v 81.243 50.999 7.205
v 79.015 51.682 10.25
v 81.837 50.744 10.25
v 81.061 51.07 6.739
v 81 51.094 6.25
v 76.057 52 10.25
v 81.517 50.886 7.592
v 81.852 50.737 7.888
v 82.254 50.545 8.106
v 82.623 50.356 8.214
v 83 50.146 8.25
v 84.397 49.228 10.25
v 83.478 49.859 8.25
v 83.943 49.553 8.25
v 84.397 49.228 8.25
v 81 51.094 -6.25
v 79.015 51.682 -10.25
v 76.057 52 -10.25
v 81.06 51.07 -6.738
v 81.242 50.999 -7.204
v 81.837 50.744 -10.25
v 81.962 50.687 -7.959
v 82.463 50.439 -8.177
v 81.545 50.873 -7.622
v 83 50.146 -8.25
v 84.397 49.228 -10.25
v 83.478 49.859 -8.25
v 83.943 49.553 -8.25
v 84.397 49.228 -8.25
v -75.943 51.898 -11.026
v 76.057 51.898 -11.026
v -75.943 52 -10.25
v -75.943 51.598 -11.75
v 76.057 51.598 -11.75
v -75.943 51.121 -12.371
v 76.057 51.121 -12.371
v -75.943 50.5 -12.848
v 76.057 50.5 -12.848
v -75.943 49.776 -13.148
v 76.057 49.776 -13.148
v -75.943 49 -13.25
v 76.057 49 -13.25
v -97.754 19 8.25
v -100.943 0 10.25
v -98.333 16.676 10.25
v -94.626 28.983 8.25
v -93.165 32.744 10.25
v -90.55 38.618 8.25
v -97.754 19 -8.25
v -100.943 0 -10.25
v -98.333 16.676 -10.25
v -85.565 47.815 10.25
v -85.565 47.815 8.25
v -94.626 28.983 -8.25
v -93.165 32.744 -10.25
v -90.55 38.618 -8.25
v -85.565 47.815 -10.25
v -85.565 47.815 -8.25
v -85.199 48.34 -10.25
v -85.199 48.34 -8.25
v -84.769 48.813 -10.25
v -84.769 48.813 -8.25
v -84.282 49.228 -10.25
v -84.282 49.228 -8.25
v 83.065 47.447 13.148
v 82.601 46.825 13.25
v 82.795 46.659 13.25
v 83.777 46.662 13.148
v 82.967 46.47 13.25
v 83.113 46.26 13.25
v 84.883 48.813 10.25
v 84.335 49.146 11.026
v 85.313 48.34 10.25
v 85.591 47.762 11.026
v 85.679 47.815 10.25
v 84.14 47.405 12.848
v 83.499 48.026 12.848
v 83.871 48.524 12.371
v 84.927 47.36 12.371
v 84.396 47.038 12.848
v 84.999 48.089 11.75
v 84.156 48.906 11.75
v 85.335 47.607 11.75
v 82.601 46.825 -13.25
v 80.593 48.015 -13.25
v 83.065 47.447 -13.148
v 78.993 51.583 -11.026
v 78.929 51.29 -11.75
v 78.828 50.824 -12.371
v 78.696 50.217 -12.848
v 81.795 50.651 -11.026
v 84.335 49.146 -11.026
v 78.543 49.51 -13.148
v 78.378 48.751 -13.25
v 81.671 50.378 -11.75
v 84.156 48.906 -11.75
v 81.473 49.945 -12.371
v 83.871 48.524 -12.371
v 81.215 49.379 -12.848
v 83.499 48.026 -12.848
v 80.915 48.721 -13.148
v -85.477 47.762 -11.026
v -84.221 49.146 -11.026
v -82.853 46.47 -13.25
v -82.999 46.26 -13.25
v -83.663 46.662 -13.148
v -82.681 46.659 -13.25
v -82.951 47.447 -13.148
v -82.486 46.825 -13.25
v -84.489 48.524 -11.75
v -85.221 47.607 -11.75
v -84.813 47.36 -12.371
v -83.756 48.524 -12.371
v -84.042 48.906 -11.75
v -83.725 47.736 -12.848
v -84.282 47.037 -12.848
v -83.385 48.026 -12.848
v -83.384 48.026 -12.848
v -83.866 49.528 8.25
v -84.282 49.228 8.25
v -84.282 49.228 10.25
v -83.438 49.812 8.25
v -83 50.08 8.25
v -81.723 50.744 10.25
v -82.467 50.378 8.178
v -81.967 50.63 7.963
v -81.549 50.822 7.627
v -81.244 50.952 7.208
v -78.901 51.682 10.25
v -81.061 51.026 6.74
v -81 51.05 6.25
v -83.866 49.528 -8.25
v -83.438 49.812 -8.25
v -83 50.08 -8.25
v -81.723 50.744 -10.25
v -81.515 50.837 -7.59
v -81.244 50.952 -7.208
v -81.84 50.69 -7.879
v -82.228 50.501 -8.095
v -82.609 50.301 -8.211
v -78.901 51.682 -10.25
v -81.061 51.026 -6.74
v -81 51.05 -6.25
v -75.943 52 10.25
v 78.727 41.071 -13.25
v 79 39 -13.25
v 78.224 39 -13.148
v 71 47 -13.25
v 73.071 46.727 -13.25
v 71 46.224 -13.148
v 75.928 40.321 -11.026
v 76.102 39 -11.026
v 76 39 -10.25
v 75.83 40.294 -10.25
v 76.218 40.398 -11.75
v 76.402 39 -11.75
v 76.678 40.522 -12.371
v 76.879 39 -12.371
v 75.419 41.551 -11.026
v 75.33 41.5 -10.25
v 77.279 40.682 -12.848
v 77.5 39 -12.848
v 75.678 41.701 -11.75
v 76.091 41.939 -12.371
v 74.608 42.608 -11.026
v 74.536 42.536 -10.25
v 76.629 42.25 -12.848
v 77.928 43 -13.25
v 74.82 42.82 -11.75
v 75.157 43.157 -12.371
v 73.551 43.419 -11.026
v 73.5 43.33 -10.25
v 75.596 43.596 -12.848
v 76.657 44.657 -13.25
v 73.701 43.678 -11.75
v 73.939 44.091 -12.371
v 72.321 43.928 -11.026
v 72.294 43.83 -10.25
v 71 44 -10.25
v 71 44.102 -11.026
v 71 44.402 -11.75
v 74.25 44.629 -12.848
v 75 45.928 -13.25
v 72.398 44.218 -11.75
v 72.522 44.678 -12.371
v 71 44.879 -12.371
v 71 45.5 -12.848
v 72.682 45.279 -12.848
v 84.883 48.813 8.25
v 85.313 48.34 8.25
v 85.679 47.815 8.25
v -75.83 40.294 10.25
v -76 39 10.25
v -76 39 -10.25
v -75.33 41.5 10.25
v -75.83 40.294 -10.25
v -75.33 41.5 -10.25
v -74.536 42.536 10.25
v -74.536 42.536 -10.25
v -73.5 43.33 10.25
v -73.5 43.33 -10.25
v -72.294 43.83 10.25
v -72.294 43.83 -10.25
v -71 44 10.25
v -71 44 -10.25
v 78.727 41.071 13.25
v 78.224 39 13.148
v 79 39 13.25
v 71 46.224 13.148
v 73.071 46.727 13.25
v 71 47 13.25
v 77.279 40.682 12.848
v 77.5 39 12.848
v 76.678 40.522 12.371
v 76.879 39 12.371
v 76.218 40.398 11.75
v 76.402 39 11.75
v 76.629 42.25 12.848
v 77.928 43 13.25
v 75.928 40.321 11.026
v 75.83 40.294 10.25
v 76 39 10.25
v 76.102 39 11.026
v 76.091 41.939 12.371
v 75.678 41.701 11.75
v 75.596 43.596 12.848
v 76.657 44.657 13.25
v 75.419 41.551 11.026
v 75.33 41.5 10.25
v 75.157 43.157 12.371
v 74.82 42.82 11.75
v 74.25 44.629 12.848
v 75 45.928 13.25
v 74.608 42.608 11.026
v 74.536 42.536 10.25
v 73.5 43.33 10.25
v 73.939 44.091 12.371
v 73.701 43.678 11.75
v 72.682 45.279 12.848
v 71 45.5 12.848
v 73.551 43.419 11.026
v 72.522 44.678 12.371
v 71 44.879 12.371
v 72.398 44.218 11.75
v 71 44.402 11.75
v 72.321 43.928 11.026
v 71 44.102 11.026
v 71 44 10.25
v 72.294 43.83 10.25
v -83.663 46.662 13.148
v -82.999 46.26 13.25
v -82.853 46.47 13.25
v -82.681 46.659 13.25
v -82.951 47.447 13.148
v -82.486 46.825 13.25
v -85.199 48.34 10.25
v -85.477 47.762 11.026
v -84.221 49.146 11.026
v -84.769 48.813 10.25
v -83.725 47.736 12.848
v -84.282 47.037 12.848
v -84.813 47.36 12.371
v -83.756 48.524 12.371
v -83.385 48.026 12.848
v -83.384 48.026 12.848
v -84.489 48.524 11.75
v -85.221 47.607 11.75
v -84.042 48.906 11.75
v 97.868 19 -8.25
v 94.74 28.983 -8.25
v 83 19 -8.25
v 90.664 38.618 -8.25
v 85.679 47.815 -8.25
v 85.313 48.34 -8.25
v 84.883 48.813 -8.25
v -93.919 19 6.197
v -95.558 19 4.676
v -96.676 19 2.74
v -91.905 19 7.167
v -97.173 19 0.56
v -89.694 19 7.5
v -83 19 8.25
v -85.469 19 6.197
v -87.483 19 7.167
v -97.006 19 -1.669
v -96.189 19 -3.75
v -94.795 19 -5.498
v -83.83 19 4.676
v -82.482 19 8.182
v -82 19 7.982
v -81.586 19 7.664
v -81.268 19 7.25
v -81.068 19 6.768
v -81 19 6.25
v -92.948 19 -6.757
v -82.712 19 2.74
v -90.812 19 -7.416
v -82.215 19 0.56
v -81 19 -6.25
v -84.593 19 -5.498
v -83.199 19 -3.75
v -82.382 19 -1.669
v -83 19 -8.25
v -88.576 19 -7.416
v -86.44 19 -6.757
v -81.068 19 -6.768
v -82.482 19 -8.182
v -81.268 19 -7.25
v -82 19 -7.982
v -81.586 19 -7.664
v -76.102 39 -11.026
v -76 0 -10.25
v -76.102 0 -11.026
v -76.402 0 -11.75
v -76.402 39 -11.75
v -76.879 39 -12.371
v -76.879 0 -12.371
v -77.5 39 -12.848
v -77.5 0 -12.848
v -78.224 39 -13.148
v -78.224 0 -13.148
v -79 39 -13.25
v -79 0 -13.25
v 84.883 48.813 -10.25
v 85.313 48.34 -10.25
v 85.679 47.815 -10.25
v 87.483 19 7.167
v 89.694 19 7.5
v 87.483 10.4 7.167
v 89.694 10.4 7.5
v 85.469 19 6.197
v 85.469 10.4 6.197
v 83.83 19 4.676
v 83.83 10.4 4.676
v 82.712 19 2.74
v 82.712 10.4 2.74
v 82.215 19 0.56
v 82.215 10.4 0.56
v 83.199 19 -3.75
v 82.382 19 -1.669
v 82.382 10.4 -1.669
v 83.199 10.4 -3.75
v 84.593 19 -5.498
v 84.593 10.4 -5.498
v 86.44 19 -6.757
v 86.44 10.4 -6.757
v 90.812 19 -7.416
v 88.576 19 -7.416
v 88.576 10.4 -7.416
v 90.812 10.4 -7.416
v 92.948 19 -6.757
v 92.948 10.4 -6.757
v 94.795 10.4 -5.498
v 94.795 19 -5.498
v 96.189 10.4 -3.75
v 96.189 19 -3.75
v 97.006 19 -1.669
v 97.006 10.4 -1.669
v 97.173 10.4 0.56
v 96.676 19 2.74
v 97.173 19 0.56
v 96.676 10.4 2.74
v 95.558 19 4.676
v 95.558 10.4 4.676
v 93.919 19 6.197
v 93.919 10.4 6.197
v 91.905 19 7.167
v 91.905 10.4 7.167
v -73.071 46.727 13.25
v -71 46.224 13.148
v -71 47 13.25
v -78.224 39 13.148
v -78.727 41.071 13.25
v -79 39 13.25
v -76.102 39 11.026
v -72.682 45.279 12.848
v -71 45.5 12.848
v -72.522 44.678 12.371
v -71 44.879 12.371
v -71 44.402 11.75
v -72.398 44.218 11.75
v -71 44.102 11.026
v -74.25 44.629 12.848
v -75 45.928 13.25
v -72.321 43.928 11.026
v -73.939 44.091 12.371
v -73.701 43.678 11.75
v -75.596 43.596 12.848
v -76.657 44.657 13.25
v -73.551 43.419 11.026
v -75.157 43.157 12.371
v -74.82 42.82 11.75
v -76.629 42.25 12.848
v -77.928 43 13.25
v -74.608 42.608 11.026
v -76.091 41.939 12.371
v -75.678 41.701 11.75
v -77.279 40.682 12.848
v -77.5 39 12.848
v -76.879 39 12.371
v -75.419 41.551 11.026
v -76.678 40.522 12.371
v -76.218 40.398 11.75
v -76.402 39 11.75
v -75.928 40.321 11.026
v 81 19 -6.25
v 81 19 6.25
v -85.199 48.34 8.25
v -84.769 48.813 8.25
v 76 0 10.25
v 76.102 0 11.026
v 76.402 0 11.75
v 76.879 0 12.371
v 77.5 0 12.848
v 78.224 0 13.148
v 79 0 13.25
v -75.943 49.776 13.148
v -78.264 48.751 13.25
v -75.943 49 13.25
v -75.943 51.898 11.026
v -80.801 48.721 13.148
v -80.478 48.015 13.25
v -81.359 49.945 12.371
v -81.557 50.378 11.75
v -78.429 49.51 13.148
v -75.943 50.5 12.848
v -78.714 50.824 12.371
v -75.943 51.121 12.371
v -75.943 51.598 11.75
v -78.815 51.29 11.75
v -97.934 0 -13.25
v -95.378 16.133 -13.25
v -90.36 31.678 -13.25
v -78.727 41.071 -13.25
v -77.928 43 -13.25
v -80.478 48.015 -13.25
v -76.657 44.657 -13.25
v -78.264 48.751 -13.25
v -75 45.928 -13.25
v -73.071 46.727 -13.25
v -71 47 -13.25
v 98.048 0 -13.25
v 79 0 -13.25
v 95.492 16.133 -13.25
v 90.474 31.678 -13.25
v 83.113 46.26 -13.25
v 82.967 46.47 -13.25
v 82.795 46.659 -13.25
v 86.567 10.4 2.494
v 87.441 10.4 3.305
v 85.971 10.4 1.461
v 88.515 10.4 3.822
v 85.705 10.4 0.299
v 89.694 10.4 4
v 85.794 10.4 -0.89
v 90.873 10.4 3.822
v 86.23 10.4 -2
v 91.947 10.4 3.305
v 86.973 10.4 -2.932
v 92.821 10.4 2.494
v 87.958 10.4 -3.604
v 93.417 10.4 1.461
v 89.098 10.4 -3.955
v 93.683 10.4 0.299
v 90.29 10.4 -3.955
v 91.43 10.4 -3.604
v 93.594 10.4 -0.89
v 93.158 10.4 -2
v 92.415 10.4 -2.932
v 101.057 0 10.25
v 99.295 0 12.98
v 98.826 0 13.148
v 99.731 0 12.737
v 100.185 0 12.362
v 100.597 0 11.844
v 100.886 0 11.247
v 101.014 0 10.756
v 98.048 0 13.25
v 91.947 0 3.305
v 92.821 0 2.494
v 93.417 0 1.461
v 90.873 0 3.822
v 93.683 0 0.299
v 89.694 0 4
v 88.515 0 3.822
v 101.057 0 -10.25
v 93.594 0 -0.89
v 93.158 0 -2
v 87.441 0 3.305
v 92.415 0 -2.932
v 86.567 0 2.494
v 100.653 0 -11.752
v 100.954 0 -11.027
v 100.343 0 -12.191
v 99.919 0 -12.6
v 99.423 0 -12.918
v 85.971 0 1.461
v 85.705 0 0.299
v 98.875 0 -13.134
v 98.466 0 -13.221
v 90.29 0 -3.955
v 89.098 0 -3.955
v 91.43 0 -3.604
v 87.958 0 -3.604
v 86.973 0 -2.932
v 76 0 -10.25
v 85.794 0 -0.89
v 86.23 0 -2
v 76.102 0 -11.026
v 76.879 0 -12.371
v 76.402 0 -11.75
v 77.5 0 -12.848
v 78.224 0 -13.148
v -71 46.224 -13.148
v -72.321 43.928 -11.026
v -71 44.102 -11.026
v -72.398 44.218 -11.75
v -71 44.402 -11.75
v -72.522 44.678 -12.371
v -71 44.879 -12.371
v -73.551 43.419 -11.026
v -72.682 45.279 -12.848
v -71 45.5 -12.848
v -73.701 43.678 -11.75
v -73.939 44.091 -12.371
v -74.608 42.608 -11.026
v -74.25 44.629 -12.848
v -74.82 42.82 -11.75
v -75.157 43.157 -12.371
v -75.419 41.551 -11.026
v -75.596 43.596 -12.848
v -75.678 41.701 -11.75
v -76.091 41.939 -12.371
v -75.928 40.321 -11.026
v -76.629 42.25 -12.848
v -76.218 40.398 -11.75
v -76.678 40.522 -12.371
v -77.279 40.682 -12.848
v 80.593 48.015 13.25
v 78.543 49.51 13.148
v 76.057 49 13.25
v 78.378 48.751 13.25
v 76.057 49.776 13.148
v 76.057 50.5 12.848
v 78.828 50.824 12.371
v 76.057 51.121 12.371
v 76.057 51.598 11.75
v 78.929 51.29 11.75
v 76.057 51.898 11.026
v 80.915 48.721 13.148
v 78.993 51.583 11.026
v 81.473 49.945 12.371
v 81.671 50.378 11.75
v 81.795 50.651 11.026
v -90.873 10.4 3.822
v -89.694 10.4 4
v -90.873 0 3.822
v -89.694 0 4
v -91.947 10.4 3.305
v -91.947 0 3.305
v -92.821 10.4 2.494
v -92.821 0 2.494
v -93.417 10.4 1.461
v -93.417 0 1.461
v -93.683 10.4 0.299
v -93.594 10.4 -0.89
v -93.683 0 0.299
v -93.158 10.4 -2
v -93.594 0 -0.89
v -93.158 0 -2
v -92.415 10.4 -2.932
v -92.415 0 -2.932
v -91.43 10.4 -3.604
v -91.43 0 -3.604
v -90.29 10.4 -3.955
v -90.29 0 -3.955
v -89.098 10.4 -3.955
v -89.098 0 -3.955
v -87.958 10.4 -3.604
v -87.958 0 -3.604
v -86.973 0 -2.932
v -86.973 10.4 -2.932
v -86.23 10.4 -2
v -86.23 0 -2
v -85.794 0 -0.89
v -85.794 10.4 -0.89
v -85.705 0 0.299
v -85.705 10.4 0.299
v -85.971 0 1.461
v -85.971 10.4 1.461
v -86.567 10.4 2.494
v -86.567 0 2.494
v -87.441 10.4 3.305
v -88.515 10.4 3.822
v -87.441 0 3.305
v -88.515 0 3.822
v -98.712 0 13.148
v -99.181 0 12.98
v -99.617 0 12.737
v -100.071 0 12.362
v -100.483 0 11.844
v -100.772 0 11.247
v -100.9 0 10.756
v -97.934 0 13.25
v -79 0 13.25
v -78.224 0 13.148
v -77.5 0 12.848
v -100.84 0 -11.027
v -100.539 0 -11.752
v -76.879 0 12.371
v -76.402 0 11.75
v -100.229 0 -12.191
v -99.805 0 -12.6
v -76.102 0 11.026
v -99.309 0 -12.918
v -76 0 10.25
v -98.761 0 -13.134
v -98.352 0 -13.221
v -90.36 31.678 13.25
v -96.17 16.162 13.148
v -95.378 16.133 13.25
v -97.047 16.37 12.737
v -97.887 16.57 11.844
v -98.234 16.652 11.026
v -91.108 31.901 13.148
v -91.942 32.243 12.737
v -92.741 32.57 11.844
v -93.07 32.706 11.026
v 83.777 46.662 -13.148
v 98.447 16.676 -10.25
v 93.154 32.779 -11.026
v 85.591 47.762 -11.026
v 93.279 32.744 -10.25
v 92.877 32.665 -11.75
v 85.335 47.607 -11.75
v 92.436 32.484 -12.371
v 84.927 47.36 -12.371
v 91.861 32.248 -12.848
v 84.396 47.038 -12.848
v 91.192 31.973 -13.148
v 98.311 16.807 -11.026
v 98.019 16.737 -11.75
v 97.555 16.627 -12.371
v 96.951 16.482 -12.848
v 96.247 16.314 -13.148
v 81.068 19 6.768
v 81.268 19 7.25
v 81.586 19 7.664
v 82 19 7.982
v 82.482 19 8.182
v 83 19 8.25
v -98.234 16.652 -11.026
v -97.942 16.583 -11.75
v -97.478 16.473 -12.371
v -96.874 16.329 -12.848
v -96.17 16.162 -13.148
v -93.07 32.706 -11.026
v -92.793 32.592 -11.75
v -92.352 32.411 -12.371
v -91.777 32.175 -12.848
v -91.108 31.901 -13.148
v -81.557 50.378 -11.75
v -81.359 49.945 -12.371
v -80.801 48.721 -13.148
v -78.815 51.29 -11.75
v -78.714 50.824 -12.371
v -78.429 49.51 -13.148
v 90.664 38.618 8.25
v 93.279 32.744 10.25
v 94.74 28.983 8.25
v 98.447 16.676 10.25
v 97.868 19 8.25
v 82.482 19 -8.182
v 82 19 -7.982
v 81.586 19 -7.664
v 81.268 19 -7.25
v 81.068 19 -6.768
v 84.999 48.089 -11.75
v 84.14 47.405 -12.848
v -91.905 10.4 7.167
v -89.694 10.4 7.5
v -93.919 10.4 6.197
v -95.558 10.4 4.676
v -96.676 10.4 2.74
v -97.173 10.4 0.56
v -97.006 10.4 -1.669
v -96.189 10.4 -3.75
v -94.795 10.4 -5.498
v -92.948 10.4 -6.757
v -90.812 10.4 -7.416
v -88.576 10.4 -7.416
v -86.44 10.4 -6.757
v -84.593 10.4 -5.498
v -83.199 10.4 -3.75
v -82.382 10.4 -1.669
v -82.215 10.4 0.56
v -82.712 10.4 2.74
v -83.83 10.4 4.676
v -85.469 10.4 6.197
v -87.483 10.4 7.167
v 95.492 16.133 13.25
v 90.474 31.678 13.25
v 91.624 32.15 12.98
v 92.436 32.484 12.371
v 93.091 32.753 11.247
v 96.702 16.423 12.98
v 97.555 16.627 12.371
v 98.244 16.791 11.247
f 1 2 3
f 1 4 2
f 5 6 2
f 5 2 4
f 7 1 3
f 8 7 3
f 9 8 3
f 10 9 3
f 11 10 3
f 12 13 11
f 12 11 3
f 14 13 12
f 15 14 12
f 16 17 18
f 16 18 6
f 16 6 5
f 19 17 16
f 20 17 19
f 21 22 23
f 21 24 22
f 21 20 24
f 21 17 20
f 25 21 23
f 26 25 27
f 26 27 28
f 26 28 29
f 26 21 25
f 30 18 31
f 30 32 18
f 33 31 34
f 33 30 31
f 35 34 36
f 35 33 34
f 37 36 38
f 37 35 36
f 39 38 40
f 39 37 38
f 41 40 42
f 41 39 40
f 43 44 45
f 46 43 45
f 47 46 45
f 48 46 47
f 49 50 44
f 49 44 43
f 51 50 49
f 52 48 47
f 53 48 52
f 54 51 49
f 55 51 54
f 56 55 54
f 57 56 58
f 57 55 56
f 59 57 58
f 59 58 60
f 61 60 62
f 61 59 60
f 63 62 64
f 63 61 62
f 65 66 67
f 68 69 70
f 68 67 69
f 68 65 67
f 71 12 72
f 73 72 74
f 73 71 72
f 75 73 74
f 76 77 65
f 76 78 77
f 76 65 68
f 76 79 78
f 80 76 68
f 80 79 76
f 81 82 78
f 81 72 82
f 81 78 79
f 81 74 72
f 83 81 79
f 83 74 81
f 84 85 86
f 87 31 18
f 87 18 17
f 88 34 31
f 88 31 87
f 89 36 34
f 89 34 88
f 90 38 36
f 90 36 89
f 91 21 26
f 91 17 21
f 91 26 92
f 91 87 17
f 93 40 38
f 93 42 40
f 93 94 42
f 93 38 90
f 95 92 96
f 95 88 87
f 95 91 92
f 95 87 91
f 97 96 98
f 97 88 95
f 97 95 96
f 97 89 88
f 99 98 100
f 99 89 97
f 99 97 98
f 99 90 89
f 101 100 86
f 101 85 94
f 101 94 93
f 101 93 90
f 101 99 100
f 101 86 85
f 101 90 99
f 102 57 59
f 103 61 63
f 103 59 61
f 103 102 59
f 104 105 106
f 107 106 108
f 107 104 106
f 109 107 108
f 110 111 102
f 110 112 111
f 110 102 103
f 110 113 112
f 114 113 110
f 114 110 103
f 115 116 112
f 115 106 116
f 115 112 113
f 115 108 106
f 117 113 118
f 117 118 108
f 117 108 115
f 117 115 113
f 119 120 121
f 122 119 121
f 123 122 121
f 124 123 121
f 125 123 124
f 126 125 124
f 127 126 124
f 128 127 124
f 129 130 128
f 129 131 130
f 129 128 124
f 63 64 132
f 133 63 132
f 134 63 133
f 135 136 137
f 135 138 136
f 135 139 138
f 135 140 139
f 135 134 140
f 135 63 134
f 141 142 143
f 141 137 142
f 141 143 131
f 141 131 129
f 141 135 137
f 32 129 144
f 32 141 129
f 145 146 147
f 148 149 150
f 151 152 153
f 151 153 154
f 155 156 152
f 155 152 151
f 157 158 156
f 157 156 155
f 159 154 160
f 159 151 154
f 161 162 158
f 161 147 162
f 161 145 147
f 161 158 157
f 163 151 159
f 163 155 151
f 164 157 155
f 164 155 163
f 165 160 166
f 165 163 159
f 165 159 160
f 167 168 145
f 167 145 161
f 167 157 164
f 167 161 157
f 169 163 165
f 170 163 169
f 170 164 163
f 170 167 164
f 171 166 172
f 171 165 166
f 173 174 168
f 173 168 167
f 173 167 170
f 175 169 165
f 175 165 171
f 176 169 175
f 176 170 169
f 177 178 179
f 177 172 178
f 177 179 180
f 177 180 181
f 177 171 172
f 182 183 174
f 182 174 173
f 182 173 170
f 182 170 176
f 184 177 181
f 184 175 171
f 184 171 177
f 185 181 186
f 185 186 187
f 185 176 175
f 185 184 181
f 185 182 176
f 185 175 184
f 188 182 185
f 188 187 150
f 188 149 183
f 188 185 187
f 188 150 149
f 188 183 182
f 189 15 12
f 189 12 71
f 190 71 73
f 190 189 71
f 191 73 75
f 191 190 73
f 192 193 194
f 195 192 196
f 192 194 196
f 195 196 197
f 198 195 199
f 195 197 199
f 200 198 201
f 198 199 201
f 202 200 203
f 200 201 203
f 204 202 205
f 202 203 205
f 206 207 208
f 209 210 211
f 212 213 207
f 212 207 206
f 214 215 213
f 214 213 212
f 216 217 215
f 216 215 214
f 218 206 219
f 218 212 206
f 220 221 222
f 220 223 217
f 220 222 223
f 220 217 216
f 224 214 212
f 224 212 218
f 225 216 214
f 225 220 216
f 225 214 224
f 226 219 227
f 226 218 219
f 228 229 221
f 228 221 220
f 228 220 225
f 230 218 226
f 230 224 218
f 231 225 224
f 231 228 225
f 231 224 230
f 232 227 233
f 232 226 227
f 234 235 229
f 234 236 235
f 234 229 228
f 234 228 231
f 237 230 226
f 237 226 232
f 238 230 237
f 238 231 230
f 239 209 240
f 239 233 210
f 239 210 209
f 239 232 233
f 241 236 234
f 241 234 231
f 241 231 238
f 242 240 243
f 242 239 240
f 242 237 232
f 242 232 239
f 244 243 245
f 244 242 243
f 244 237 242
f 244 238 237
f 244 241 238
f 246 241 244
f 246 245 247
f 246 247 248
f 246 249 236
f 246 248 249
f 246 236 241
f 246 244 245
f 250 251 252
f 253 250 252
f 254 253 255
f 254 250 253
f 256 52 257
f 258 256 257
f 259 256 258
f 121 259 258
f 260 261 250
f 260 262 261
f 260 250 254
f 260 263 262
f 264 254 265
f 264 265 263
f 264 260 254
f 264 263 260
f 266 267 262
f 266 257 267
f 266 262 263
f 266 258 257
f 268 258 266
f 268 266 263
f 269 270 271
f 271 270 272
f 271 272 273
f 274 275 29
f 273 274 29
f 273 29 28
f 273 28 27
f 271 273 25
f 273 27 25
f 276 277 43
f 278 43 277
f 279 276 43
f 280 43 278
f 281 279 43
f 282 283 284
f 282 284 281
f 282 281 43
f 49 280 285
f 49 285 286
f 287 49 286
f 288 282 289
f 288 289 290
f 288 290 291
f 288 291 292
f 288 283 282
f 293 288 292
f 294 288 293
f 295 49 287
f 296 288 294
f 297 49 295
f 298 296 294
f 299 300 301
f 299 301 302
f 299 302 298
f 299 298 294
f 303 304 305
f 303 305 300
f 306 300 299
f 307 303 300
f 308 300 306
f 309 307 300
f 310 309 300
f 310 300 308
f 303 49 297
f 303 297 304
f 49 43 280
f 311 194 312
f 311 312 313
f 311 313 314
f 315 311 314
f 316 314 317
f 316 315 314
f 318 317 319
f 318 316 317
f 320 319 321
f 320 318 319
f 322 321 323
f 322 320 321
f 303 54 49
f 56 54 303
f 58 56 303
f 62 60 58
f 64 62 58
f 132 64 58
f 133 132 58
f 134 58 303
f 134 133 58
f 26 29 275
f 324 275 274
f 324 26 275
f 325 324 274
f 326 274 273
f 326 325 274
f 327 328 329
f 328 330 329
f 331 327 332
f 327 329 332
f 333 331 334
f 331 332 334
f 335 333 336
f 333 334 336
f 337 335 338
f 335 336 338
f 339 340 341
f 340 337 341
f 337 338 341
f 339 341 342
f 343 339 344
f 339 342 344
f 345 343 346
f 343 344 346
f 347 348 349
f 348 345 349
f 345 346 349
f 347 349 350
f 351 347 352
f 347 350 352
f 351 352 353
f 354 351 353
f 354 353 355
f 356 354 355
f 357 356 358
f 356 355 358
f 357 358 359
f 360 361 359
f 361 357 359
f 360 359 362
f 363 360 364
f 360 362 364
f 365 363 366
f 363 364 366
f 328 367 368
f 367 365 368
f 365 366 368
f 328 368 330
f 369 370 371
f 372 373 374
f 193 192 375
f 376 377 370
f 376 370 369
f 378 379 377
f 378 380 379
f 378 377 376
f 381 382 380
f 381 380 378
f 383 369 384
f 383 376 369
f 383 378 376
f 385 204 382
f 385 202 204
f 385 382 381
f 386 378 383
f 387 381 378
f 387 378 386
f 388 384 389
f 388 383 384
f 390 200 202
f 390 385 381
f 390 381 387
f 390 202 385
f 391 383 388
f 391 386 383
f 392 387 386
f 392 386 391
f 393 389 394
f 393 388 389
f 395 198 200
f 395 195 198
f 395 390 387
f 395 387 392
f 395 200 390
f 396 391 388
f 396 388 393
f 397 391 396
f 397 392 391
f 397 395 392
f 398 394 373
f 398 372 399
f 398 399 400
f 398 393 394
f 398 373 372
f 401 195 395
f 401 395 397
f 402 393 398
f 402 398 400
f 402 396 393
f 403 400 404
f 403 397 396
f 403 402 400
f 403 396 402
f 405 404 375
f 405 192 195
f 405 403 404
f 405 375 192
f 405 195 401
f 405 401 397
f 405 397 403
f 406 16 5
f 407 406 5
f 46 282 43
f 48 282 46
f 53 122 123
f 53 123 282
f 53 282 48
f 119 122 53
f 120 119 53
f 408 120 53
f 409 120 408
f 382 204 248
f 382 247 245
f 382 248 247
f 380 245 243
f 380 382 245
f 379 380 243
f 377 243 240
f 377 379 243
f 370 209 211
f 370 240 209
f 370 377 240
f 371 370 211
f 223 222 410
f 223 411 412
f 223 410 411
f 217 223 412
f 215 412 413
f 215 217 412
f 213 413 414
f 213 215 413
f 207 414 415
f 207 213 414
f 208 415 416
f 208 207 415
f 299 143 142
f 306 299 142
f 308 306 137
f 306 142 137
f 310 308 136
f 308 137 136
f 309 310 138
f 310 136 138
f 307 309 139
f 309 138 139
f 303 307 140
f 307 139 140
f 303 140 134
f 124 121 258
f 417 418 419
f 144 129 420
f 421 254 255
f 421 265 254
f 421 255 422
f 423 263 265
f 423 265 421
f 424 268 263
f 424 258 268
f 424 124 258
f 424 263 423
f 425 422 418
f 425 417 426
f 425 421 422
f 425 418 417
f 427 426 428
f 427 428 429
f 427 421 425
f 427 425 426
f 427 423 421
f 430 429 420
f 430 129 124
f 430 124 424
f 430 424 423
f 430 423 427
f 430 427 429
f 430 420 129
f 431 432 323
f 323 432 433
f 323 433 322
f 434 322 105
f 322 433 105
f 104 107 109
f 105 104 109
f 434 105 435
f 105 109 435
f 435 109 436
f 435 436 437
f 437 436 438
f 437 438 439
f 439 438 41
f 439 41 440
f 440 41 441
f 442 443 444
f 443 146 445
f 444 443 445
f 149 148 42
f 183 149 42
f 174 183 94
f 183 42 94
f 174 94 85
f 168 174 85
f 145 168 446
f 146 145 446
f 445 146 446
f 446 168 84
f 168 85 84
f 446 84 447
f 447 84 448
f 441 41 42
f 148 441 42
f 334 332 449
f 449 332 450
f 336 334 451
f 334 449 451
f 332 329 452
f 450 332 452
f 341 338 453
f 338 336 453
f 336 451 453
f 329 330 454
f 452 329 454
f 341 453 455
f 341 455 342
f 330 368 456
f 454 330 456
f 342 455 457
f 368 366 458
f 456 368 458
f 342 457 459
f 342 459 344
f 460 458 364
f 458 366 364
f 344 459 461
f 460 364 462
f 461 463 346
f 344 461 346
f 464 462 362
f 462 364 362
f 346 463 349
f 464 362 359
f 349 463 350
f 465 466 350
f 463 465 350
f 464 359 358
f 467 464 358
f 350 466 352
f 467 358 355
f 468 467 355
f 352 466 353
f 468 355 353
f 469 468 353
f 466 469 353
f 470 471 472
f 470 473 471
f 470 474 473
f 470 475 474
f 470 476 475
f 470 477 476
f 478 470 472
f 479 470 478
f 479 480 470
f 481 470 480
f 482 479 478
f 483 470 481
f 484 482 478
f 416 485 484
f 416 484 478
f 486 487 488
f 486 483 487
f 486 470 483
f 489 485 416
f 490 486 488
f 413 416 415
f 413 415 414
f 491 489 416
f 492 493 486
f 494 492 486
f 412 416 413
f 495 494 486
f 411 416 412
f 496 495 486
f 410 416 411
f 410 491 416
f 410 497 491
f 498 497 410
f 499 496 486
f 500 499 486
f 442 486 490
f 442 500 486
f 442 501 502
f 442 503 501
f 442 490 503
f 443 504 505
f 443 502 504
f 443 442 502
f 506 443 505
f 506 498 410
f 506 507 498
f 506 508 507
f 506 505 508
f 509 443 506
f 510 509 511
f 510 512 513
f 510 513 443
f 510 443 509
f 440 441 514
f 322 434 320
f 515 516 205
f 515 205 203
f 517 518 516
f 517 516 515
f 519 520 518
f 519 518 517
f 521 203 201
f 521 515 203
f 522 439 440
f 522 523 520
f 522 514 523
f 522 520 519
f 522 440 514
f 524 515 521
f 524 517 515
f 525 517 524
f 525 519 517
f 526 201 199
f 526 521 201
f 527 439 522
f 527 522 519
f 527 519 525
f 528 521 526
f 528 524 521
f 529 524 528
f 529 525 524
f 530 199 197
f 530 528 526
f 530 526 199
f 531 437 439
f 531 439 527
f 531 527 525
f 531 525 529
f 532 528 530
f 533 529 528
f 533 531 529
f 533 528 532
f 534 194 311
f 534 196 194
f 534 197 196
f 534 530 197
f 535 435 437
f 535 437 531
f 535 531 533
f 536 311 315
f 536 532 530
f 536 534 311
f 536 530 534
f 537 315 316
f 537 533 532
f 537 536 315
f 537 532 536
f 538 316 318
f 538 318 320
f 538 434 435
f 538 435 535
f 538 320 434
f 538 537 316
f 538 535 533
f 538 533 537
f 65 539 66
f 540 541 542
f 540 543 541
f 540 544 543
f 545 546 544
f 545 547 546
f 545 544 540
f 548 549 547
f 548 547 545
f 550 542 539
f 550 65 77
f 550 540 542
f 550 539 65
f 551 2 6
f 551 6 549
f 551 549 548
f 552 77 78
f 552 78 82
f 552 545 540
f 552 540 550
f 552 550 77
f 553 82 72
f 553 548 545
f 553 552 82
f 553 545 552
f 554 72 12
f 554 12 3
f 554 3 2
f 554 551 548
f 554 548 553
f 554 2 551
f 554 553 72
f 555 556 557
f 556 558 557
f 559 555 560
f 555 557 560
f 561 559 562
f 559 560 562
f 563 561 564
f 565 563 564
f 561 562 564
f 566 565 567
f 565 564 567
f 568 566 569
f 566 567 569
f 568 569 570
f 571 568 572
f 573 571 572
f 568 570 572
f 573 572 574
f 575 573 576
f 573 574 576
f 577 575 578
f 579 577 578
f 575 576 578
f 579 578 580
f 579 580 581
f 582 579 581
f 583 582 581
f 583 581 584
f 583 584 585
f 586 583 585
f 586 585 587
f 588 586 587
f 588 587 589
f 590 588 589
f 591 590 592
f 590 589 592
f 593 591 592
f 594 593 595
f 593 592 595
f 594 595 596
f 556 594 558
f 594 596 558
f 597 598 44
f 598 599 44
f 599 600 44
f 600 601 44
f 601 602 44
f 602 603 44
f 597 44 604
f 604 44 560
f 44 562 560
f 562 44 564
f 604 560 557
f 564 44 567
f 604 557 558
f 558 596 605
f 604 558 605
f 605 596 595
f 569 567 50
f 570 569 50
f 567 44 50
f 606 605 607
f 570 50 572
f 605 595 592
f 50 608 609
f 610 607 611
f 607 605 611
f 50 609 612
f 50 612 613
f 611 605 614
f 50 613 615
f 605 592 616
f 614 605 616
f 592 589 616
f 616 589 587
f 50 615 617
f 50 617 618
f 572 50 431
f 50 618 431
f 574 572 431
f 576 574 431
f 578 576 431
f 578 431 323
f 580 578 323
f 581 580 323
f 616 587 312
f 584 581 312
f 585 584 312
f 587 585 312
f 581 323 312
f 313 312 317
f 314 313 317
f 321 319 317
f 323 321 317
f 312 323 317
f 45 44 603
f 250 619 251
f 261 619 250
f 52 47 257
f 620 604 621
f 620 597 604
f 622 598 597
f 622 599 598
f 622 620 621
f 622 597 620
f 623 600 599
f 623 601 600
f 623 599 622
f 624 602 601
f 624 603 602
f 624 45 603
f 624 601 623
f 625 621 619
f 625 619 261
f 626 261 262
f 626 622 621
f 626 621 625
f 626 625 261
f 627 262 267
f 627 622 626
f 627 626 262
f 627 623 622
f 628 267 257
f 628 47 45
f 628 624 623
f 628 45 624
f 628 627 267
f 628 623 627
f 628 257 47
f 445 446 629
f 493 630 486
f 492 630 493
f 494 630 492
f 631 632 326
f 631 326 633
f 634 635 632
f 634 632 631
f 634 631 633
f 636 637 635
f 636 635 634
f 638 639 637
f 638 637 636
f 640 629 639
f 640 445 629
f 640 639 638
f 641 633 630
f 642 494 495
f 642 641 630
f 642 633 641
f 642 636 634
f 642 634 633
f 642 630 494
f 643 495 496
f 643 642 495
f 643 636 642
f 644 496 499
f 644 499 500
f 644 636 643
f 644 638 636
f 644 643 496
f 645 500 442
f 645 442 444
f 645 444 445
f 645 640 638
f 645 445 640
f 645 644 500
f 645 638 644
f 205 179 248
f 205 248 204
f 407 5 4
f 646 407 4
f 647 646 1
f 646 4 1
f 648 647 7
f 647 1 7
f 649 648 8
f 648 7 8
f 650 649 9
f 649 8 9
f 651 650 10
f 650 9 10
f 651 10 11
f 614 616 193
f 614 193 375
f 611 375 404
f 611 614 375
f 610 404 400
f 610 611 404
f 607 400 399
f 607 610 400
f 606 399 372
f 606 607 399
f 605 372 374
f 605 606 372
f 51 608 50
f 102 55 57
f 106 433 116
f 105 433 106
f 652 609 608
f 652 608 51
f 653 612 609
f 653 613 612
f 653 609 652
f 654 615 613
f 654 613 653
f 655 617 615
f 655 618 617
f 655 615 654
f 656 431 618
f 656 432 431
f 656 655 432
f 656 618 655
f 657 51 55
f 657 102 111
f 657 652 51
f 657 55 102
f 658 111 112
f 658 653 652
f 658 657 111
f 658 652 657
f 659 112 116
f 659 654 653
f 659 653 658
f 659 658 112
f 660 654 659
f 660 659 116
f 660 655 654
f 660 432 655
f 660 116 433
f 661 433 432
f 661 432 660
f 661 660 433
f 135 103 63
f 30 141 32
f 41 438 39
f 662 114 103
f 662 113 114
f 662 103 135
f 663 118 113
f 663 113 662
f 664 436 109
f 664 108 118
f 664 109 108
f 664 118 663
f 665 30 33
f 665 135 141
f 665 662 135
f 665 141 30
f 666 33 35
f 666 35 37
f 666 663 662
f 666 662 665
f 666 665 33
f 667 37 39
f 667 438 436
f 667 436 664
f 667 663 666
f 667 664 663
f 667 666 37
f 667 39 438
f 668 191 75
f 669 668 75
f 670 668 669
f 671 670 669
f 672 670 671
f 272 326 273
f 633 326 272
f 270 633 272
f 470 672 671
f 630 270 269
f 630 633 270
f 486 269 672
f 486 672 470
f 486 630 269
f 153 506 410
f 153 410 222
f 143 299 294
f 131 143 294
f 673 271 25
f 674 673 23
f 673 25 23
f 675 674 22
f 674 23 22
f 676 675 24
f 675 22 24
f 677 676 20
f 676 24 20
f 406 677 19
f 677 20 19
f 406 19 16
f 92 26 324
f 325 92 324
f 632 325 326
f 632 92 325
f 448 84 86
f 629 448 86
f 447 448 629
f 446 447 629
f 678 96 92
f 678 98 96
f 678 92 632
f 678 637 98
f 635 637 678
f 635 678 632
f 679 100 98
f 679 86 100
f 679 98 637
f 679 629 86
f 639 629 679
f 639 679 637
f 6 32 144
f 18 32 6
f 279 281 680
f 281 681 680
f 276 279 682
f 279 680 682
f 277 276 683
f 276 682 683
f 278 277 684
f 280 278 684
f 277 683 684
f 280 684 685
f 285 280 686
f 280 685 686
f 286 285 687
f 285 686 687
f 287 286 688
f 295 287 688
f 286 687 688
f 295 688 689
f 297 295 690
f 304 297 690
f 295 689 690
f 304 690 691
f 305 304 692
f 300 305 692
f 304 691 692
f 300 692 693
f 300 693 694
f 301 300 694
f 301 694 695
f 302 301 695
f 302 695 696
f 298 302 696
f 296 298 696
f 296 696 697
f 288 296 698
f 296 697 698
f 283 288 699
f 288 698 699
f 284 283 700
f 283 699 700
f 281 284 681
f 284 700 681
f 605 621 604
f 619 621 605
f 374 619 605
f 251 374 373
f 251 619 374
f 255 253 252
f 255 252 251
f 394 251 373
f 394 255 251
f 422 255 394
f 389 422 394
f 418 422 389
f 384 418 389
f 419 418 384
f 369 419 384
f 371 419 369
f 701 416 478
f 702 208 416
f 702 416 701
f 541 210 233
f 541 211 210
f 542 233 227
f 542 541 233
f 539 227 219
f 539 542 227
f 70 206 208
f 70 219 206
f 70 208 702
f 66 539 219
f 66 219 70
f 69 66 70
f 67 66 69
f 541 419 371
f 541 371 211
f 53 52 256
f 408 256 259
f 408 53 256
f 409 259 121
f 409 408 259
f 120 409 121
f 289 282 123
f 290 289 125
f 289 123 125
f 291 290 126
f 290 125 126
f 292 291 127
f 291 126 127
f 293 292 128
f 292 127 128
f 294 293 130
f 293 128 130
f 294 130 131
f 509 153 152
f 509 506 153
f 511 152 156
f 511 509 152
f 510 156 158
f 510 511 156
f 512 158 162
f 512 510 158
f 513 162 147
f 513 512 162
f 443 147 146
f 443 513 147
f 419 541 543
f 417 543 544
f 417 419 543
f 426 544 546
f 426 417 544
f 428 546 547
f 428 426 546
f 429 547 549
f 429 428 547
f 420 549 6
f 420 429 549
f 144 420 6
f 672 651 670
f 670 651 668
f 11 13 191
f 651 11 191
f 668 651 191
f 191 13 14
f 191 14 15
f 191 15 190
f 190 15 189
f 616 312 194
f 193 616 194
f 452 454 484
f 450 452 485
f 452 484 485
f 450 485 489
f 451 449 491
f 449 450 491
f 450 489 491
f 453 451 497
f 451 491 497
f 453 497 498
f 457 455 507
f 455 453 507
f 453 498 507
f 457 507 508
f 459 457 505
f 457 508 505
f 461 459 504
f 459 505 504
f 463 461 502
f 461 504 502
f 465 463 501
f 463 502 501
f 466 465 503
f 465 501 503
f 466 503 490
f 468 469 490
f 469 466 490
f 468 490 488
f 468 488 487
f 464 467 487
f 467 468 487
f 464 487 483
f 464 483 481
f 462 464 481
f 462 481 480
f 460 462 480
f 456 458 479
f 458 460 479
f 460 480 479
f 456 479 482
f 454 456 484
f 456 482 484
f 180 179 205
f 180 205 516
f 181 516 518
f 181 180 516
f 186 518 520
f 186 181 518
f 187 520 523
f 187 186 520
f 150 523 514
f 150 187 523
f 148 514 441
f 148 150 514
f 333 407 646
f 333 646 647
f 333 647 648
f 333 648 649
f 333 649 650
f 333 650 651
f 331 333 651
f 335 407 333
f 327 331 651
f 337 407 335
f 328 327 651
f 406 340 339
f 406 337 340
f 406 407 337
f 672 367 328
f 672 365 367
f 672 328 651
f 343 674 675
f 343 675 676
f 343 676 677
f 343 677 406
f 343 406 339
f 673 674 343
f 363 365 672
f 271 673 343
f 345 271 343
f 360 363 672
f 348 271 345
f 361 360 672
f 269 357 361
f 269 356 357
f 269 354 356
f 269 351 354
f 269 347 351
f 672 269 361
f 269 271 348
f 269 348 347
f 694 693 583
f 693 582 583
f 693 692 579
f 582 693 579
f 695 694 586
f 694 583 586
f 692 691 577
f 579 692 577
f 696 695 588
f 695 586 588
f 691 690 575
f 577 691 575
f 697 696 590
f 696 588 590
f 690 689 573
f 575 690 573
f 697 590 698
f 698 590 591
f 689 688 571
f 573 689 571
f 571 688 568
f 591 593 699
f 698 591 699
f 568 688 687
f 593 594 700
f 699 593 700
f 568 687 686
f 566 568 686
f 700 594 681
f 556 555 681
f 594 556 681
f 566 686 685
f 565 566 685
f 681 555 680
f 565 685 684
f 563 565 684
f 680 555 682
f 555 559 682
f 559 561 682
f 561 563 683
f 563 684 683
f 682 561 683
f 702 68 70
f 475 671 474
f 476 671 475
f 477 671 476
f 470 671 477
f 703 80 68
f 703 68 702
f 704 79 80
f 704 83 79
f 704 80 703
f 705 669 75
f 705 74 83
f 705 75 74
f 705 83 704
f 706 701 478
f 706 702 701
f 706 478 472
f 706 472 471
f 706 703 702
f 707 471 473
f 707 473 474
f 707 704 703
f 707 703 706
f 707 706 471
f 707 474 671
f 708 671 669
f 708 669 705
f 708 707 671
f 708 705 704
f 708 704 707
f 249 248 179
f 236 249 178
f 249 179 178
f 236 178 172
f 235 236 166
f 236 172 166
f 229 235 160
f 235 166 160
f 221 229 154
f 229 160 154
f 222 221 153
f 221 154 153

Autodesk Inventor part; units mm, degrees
ref_plane "YZ Plane" through (0, 0, 0) normal (1, 0, 0) x (0, 1, 0)
ref_plane "XZ Plane" through (0, 0, 0) normal (0, 1, 0) x (-1, 0, 0)
ref_plane "XY Plane" through (0, 0, 0) normal (0, 0, 1) x (1, 0, 0)
sketch "Sketch1" plane through (0, 0, 0) normal (0, 0, 1) x (1, 0, 0)
  line L0 (0.057, 44) -> (71, 44)
  line L1 (76.057, 52) -> (0.057, 52)
  line L2 (101.057, 0) -> (76, 0)
  line L3 (76, 0) -> (76, 39)
  arc A0 (101.057, 0) -> (85.6787, 47.8152) centre (-6.9827, -8.3672) ccw
  arc A1 (84.3966, 49.2278) -> (76.057, 52) centre (76.057, 38.0701) ccw
  arc A2 (85.6787, 47.8152) -> (84.3966, 49.2278) centre (81.4032, 45.2229) ccw
  line L4 (0.057, 44) -> (-71, 44)
  line L5 (-75.943, 52) -> (0.057, 52)
  line L6 (-100.943, 0) -> (-76, 0)
  line L7 (-76, 0) -> (-76, 39)
  arc A3 (-85.5646, 47.8152) -> (-100.943, 0) centre (7.0967, -8.3672) ccw
  arc A4 (-75.943, 52) -> (-84.2825, 49.2278) centre (-75.943, 38.0701) ccw
  arc A5 (-84.2825, 49.2278) -> (-85.5646, 47.8152) centre (-81.2891, 45.2229) ccw
  arc A6 (76, 39) -> (71, 44) centre (71, 39) ccw
  arc A7 (-71, 44) -> (-76, 39) centre (-71, 39) ccw
  line L8 (0, -20.5757) -> (0, 64.8833) projected
  point P0 (0, 0)
  point P1 (76, 44)
  point P2 (0.1141, 0)
  point P3 (-76, 44)
  dimension "d1" = 44
  dimension "d2" = 8
  dimension "d4" = 5
  dimension "d5" = 152
  dimension "d10" = 5
extrude "Extrusion1" add sketch "Sketch1" along normal mid plane 26.5
fillet "Fillet1" radius 3 14 edges at (-80.3371, 51.2888, 13.25) (-84.9915, 48.5832, 13.25) (-96.0624, 24.8109, 13.25) (80.4512, 51.2888, 13.25) (85.1056, 48.5832, 13.25) (96.1764, 24.8109, 13.25) (0.057, 52, 13.25) (80.4512, 51.2888, -13.25) (85.1056, 48.5832, -13.25) (96.1764, 24.8109, -13.25) (-80.3371, 51.2888, -13.25) (-84.9915, 48.5832, -13.25) (-96.0624, 24.8109, -13.25) (0.057, 52, -13.25)
fillet "Fillet2" radius 3 6 edges at (0, 44, 13.25) (76, 19.5, 13.25) (-76, 19.5, 13.25) (-76, 19.5, -13.25) (0, 44, -13.25) (76, 19.5, -13.25)
sketch "Sketch2" plane through (-75.943, 52, -10.25) normal (0, 1, 0) x (1, 0, 0)
  line L0 (-0.057, 0) -> (-0.057, -20.5) projected
  line L1 (151.943, 0) -> (151.943, -20.5) projected
  line L2 (177, 0) -> (177, -20.5) projected
  line L3 (177, -2) -> (158.943, -2)
  line L4 (156.943, -4) -> (156.943, -16.5)
  line L5 (158.943, -18.5) -> (177, -18.5)
  line L6 (177, -18.5) -> (177, -2)
  line L7 (159.0563, 3) -> (173.9908, 3) projected
  line L8 (173.9908, -23.5) -> (159.0563, -23.5) projected
  arc A0 (158.943, -2) -> (156.943, -4) centre (158.943, -4) ccw
  arc A1 (156.943, -16.5) -> (158.943, -18.5) centre (158.943, -16.5) ccw
  line L9 (-25, 0) -> (-25, -20.5) projected
  line L10 (-25, -2) -> (-7.057, -2)
  line L11 (-5.057, -4) -> (-5.057, -16.5)
  line L12 (-7.057, -18.5) -> (-25, -18.5)
  line L13 (-25, -18.5) -> (-25, -2)
  arc A2 (-5.057, -4) -> (-7.057, -2) centre (-7.057, -4) ccw
  arc A3 (-7.057, -18.5) -> (-5.057, -16.5) centre (-7.057, -16.5) ccw
  point P0 (75.943, -10.25)
  point P1 (166.5236, 3)
  dimension "d11" = 5
  dimension "d12" = 5
  dimension "d13" = 5
  dimension "d14" = 2
  dimension "d15" = 5
  dimension "d16" = 2
extrude "Extrusion2" cut sketch "Sketch2" against normal blind 33
sketch "Sketch3" plane through (-75.943, 19, -10.25) normal (0, 1, 0) x (1, 0, 0)
  line L0 (-65.4065, -10.25) -> (217.4065, -10.25) projected
  line L1 (-5.057, -4) -> (-5.057, -16.5) projected
  line L2 (75.943, 8.3065) -> (75.943, -28.8065) projected
  point P0 (75.943, -10.25)
  point P1 (-13.751, -10.25)
  dimension "d27" = 89.694
hole "Hole1" at (-89.694, 19, 0) direction (0, -1, 0) diameter 8 end through all counterbore diameter 15 counterbore depth 8.6
mirror "Mirror1" about plane through (0, 0, 0) normal (1, 0, 0) of "Hole1"
properties part number "Handle" material "Acetal Resin, Black"
